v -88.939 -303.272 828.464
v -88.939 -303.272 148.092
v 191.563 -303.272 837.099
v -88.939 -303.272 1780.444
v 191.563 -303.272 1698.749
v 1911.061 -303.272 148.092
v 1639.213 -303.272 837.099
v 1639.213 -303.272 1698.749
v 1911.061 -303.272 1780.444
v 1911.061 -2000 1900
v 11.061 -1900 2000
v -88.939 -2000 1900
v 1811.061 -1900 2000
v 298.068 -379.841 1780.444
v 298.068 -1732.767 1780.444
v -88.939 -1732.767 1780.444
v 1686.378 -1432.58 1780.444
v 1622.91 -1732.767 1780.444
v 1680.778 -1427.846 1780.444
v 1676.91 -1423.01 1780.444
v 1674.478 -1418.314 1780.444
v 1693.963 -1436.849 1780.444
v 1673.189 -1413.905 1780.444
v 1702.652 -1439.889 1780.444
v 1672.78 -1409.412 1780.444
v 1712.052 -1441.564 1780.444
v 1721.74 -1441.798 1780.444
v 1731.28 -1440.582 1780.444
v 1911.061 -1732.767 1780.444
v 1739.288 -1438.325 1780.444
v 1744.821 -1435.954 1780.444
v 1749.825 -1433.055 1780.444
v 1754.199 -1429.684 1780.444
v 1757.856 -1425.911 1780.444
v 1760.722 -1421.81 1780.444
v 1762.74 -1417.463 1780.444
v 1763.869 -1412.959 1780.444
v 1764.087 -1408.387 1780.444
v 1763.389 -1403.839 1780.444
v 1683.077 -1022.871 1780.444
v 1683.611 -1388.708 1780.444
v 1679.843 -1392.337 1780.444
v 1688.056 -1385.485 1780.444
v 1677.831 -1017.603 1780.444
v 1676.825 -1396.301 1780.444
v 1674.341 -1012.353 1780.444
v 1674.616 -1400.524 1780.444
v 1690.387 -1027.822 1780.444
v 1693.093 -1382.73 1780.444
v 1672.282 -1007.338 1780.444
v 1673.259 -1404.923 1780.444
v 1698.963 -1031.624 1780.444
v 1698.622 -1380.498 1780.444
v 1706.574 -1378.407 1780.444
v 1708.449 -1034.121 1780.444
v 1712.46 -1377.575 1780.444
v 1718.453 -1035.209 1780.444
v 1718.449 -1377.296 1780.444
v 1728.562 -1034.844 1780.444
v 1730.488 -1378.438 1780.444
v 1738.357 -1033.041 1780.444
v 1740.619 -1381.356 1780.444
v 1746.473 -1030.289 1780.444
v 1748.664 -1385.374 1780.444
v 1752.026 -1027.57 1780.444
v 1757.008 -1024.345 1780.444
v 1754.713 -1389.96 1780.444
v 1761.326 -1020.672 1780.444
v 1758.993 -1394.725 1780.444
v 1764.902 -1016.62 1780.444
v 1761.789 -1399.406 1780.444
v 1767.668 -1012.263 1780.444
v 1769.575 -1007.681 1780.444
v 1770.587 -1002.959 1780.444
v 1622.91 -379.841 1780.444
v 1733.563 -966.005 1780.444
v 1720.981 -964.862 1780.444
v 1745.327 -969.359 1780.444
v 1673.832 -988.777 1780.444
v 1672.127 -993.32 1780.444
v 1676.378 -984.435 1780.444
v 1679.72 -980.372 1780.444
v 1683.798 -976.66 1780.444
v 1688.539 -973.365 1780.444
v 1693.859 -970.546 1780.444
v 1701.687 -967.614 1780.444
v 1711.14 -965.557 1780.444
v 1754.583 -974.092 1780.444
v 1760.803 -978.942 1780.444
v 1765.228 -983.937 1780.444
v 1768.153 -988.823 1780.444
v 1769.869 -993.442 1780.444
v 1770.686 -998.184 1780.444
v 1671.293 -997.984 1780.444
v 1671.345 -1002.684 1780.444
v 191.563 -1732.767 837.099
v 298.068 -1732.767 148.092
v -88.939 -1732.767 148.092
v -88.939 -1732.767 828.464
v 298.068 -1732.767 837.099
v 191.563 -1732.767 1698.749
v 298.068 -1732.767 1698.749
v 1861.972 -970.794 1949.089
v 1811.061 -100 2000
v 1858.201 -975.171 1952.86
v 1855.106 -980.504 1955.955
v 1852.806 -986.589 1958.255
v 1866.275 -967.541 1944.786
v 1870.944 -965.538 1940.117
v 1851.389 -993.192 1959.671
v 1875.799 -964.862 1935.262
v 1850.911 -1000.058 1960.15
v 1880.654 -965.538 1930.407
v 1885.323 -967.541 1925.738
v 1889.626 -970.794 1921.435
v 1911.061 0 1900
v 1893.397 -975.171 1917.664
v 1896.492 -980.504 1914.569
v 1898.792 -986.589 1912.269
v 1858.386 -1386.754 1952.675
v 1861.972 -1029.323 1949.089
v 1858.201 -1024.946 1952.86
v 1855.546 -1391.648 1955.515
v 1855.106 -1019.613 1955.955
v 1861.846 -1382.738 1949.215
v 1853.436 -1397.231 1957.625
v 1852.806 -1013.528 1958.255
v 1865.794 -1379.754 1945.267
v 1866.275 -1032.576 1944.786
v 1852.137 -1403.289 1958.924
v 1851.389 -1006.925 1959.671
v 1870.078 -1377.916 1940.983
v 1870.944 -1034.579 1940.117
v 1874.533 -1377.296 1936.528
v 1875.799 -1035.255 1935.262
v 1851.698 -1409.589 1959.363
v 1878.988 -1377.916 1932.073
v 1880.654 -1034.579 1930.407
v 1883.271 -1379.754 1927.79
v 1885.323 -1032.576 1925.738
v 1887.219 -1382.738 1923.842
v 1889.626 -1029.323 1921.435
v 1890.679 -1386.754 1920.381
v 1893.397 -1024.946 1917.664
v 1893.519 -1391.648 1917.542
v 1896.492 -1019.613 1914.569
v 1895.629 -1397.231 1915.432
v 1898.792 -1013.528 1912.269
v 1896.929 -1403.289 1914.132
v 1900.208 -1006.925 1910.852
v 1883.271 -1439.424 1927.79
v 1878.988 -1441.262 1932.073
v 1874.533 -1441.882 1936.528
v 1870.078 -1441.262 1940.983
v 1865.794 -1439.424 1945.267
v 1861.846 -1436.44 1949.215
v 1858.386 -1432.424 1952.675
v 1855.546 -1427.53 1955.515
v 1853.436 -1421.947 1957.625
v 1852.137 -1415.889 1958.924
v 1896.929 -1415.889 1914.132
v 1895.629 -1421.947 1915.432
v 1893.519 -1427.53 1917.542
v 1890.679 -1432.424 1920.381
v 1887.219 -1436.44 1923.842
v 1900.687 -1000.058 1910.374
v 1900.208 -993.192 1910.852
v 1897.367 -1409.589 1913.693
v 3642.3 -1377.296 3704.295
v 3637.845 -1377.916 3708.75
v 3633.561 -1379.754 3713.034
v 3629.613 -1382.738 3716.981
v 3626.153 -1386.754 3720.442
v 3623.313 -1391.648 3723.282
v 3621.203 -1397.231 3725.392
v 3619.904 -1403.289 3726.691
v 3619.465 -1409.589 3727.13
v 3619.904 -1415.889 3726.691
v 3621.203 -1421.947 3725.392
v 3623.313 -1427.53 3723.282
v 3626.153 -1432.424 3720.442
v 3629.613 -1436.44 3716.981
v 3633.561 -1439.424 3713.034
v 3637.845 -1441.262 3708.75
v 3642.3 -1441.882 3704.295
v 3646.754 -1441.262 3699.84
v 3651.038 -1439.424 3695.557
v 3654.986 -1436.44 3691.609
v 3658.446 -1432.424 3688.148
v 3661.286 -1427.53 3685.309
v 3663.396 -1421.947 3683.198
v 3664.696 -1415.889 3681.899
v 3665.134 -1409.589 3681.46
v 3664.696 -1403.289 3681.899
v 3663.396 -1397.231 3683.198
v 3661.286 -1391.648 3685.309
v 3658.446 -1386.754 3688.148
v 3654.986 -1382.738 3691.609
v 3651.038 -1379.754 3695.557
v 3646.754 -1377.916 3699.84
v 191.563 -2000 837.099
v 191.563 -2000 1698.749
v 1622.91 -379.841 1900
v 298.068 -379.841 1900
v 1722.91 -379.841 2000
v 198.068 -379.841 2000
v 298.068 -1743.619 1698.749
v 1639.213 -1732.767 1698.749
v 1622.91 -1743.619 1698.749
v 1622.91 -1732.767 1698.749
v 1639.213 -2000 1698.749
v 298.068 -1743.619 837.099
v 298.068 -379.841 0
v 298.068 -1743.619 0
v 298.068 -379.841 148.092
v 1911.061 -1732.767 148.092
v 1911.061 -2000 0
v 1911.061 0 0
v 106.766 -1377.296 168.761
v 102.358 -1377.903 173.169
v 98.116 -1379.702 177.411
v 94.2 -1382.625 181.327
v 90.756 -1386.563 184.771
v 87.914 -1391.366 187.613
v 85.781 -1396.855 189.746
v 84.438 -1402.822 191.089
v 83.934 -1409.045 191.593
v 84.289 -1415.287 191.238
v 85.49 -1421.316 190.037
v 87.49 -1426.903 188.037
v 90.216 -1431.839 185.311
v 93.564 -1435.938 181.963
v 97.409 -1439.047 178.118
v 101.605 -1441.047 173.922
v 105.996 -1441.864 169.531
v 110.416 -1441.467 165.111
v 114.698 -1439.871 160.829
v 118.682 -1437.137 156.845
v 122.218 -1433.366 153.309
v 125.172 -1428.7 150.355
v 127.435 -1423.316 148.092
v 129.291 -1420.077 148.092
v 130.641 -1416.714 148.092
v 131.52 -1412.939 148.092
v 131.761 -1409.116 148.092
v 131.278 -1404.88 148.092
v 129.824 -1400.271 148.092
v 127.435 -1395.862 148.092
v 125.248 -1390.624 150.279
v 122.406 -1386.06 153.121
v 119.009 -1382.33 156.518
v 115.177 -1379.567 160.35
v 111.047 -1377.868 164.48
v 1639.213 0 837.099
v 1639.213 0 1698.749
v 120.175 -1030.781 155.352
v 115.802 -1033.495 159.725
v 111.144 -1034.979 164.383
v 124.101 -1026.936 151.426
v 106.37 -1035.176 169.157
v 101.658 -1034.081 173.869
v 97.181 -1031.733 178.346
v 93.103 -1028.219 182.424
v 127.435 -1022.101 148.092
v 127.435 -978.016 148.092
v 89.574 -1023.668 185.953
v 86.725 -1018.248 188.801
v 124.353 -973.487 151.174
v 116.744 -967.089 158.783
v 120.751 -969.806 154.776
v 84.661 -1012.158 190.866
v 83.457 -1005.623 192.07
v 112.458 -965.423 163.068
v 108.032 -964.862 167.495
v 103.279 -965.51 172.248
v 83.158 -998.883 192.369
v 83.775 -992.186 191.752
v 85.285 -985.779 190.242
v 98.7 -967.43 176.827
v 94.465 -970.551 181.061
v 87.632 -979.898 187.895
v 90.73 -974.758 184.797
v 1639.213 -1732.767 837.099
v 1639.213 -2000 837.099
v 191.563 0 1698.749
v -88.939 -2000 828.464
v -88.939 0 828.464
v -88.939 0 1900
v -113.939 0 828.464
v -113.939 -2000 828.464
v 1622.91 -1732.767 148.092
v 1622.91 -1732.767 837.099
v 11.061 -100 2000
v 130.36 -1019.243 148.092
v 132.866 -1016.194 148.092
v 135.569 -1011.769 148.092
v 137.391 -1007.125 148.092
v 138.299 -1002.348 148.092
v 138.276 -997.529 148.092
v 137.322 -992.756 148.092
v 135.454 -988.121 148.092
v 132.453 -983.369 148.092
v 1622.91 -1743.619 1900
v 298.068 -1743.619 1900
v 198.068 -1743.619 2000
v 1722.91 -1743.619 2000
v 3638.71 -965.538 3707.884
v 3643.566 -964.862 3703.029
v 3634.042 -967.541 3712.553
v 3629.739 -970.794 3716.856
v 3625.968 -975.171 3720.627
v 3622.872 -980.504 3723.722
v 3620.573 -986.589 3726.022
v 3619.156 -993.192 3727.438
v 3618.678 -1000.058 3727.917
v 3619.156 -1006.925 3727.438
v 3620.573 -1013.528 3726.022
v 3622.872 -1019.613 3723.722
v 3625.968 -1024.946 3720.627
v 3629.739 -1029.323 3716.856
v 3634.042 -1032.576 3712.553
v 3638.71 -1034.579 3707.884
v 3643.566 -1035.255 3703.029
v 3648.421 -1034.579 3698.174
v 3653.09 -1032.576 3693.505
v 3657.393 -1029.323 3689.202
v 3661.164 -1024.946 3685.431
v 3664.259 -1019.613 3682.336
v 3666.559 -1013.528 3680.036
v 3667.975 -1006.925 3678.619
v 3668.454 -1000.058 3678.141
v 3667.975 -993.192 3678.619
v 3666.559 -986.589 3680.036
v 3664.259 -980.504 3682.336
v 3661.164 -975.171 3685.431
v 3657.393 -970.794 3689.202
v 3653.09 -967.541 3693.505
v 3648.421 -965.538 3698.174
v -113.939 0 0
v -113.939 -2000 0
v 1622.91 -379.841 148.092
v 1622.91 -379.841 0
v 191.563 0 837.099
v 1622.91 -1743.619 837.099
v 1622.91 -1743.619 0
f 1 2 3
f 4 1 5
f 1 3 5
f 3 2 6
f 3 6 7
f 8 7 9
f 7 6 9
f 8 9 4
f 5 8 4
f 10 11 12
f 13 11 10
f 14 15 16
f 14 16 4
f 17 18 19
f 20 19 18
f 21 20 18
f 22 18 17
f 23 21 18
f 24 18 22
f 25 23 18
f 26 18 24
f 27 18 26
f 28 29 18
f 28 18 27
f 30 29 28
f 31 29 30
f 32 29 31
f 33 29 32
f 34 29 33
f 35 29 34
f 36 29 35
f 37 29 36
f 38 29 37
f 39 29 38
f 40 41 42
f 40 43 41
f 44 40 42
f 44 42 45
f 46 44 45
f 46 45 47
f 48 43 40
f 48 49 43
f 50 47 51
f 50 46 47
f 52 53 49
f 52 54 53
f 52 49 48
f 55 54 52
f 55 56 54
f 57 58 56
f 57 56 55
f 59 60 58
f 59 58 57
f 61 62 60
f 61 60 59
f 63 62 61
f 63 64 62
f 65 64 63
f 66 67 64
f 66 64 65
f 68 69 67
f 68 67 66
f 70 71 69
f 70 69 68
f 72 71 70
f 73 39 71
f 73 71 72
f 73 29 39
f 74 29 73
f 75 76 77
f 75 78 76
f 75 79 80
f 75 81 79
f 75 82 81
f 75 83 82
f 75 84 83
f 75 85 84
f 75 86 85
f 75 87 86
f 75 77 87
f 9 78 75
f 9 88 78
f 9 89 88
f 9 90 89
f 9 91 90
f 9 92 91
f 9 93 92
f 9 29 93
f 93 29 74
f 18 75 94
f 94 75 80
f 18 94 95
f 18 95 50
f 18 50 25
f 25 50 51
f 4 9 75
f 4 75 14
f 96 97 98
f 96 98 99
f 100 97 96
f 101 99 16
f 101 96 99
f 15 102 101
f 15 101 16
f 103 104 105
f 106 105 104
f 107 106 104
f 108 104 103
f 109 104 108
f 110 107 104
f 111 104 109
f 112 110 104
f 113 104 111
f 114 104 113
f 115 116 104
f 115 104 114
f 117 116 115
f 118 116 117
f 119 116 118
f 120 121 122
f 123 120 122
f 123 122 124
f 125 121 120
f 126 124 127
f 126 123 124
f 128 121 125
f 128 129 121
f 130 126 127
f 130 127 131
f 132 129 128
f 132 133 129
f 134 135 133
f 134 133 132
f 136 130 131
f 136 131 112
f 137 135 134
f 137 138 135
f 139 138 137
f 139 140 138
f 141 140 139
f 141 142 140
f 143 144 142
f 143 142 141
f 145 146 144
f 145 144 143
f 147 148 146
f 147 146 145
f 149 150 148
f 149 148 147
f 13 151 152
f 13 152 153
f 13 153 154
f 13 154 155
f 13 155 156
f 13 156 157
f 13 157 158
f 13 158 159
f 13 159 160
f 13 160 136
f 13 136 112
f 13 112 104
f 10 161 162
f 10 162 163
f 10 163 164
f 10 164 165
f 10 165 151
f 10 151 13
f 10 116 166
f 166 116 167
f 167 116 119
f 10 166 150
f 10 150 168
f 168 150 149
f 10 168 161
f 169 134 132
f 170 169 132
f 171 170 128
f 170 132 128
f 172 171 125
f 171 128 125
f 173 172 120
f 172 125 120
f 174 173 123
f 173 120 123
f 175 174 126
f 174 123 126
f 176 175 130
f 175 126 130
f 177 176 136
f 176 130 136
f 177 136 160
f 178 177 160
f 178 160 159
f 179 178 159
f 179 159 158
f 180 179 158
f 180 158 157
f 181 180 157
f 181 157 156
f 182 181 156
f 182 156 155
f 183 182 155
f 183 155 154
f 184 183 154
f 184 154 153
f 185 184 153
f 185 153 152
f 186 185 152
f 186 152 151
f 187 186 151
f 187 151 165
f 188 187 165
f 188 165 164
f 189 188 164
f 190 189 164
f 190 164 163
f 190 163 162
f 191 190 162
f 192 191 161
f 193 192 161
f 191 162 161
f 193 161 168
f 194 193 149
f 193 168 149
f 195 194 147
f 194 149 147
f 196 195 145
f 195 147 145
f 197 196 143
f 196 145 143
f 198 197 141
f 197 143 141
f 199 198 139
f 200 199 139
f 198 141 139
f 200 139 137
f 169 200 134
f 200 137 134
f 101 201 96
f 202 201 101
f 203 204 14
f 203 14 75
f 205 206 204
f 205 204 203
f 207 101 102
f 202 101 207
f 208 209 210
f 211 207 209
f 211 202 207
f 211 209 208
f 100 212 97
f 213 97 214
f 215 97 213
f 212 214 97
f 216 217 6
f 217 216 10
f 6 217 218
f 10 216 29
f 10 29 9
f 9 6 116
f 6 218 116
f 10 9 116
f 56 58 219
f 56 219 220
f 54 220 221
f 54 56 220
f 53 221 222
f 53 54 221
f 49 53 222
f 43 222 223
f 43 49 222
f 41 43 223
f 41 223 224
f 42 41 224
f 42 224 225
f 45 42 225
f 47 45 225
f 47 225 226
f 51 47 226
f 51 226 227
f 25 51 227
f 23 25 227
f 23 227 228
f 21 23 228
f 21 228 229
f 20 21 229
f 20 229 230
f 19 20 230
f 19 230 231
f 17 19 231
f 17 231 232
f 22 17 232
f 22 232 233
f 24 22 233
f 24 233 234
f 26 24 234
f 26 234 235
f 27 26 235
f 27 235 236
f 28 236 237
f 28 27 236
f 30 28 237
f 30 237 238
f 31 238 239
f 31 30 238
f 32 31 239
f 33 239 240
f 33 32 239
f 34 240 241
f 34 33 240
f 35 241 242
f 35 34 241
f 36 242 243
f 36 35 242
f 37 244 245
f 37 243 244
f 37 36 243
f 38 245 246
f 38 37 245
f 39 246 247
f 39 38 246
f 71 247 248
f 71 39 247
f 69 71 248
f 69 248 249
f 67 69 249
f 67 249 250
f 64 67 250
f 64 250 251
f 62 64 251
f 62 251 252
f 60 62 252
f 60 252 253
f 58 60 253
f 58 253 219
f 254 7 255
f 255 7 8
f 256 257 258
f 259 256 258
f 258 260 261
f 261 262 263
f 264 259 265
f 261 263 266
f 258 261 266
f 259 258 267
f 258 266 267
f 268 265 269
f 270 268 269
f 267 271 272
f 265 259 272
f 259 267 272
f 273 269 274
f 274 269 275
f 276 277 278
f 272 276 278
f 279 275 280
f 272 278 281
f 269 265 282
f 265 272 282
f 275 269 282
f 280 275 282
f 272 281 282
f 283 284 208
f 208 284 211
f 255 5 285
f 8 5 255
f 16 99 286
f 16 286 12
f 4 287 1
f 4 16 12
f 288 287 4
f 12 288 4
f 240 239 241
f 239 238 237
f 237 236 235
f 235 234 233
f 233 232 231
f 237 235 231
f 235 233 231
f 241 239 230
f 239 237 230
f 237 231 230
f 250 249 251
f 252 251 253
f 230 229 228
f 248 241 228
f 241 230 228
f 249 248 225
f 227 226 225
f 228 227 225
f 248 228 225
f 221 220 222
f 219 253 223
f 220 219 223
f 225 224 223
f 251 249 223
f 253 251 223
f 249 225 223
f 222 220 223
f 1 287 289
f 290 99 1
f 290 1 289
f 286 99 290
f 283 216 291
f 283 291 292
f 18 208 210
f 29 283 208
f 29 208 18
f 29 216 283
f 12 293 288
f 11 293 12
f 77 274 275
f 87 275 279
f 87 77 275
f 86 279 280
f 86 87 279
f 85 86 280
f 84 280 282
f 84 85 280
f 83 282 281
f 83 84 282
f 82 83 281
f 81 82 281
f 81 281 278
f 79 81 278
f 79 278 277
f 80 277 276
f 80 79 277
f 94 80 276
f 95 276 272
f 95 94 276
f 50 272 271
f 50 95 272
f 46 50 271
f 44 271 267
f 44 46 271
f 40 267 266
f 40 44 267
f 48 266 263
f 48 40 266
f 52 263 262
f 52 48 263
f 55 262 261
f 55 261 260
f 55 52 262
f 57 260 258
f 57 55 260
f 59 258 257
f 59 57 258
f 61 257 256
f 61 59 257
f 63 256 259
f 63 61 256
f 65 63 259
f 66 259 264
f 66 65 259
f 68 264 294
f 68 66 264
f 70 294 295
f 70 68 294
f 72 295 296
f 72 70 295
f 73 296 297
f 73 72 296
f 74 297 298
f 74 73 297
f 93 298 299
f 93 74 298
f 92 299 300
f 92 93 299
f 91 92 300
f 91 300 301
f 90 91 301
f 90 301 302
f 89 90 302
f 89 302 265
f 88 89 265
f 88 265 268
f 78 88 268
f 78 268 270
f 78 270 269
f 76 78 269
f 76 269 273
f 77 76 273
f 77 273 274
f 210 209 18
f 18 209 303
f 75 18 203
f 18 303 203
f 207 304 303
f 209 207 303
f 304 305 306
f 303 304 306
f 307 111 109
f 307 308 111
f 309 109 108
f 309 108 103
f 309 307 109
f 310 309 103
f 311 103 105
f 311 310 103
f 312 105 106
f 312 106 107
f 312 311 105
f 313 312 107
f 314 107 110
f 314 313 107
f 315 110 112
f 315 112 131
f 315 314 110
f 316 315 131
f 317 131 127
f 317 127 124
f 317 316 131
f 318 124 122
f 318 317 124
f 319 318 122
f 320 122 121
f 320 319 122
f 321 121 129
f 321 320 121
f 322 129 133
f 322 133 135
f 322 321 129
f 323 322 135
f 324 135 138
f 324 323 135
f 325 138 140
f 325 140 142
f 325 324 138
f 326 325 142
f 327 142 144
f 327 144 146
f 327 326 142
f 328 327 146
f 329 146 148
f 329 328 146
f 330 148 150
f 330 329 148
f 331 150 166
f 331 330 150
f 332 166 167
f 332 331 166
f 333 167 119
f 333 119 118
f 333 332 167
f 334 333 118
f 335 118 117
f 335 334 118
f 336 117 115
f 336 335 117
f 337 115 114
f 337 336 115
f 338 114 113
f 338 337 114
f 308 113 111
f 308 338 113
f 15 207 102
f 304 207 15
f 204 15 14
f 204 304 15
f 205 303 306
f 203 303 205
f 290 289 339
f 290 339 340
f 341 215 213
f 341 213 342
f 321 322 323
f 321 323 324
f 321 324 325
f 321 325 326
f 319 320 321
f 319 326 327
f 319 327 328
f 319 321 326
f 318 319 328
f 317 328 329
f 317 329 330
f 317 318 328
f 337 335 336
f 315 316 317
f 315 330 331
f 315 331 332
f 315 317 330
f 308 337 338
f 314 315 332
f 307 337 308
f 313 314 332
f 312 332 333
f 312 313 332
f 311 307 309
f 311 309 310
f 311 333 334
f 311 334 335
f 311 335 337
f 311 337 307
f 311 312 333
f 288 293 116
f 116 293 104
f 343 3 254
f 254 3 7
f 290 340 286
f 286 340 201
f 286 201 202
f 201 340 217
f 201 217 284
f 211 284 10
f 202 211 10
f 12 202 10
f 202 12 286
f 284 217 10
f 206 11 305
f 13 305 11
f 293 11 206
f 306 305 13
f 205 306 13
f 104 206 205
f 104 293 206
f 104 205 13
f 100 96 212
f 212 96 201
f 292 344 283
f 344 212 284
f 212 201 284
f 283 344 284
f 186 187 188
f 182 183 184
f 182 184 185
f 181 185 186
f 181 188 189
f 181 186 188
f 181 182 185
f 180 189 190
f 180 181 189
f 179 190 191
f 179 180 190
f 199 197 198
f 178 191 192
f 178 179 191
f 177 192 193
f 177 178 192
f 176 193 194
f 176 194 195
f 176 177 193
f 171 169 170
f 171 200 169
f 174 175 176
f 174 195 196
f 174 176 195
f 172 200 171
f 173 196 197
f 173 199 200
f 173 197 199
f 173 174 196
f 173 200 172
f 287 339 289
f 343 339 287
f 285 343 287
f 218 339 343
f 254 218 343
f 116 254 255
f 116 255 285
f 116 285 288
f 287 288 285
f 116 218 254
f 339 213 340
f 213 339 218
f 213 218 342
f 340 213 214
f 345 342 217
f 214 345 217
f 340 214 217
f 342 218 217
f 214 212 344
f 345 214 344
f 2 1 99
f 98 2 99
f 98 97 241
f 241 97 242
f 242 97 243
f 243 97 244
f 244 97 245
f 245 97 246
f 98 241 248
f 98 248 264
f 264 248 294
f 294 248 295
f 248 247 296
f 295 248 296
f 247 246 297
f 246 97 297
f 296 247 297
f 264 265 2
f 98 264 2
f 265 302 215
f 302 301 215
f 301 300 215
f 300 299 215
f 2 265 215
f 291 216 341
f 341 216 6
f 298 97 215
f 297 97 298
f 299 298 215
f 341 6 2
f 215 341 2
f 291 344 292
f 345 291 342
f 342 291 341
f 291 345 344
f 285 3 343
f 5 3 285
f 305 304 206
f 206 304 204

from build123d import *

# Parameters (mm, degrees)
F0_W      = 2000
F0_H      = 2000
F1_DEPTH  = 2000
F2_W      = 1447.650209
F2_H      = 861.64999
F3_DEPTH  = 2000.001
F4_W      = 1324.842453
F4_H      = 1363.778203
F5_DEPTH  = 2000.001
F6_W      = 1429.494679
F6_H      = 1632.352204
F7_DEPTH  = 2000.001
F8_SIZE   = 100
F9_W      = 2000
F9_H      = 828.463554
F10_DEPTH = 25
F11_R     = 32.29333
F11_R_2   = 35.196484
F12_DEPTH = 2500


with BuildPart() as f1:
    # F0 (on Front) → F1 (new body)
    with BuildSketch(Plane.XZ):
        with Locations((911.060803, 1000)):
            Rectangle(F0_W, F0_H)
    extrude(amount=F1_DEPTH)

    # F2 (on face) → F3 (cut, through all)
    with BuildSketch(Plane.XZ.offset(2000)):
        with Locations((915.388099, 1267.924309)):
            Rectangle(F2_W, F2_H)
    extrude(amount=-F3_DEPTH, mode=Mode.SUBTRACT)

    # F4 (on face) → F5 (cut, through all)
    with BuildSketch(Plane.XY.offset(2000)):
        with Locations((960.488796, -1061.729983)):
            Rectangle(F4_W, F4_H)
    extrude(amount=-F5_DEPTH, mode=Mode.SUBTRACT)

    # F6 (on face) → F7 (cut, through all)
    with BuildSketch(Plane.YZ.offset(1911.060803)):
        with Locations((-1018.019646, 964.268282)):
            Rectangle(F6_W, F6_H)
    extrude(amount=-F7_DEPTH, mode=Mode.SUBTRACT)

    # F8
    f8_edges = [f1.edges().sort_by_distance(p)[0] for p in [
        (1911.060803, -1000, 2000),
        (911.060803, 0, 2000),
        (911.060803, -2000, 2000),
        (-88.939197, -1000, 2000),
        (298.06757, -1061.729982, 2000),
        (1622.910023, -1061.729982, 2000),
    ]]
    chamfer(f8_edges, length=F8_SIZE)

    # F9 (on face) → F10 (join)
    with BuildSketch(Plane(origin=(-88.939197, 0, 0), x_dir=(0, -1, 0), z_dir=(-1, 0, 0))):
        with Locations((1000, 414.231777)):
            Rectangle(F9_W, F9_H)
    extrude(amount=F10_DEPTH)

    # F11 (on face) → F12 (join, symmetric)
    with BuildSketch(Plane(origin=(1905.530401, 0, 1905.530401), x_dir=(0, 1, 0), z_dir=(0.707107, 0, 0.707107))):
        with Locations((-1409.589052, 43.837443)):
            Circle(F11_R)
        with Locations((-1000.058413, 42.046707)):
            Circle(F11_R_2)
    extrude(amount=F12_DEPTH, both=True)


solid = f1.part
